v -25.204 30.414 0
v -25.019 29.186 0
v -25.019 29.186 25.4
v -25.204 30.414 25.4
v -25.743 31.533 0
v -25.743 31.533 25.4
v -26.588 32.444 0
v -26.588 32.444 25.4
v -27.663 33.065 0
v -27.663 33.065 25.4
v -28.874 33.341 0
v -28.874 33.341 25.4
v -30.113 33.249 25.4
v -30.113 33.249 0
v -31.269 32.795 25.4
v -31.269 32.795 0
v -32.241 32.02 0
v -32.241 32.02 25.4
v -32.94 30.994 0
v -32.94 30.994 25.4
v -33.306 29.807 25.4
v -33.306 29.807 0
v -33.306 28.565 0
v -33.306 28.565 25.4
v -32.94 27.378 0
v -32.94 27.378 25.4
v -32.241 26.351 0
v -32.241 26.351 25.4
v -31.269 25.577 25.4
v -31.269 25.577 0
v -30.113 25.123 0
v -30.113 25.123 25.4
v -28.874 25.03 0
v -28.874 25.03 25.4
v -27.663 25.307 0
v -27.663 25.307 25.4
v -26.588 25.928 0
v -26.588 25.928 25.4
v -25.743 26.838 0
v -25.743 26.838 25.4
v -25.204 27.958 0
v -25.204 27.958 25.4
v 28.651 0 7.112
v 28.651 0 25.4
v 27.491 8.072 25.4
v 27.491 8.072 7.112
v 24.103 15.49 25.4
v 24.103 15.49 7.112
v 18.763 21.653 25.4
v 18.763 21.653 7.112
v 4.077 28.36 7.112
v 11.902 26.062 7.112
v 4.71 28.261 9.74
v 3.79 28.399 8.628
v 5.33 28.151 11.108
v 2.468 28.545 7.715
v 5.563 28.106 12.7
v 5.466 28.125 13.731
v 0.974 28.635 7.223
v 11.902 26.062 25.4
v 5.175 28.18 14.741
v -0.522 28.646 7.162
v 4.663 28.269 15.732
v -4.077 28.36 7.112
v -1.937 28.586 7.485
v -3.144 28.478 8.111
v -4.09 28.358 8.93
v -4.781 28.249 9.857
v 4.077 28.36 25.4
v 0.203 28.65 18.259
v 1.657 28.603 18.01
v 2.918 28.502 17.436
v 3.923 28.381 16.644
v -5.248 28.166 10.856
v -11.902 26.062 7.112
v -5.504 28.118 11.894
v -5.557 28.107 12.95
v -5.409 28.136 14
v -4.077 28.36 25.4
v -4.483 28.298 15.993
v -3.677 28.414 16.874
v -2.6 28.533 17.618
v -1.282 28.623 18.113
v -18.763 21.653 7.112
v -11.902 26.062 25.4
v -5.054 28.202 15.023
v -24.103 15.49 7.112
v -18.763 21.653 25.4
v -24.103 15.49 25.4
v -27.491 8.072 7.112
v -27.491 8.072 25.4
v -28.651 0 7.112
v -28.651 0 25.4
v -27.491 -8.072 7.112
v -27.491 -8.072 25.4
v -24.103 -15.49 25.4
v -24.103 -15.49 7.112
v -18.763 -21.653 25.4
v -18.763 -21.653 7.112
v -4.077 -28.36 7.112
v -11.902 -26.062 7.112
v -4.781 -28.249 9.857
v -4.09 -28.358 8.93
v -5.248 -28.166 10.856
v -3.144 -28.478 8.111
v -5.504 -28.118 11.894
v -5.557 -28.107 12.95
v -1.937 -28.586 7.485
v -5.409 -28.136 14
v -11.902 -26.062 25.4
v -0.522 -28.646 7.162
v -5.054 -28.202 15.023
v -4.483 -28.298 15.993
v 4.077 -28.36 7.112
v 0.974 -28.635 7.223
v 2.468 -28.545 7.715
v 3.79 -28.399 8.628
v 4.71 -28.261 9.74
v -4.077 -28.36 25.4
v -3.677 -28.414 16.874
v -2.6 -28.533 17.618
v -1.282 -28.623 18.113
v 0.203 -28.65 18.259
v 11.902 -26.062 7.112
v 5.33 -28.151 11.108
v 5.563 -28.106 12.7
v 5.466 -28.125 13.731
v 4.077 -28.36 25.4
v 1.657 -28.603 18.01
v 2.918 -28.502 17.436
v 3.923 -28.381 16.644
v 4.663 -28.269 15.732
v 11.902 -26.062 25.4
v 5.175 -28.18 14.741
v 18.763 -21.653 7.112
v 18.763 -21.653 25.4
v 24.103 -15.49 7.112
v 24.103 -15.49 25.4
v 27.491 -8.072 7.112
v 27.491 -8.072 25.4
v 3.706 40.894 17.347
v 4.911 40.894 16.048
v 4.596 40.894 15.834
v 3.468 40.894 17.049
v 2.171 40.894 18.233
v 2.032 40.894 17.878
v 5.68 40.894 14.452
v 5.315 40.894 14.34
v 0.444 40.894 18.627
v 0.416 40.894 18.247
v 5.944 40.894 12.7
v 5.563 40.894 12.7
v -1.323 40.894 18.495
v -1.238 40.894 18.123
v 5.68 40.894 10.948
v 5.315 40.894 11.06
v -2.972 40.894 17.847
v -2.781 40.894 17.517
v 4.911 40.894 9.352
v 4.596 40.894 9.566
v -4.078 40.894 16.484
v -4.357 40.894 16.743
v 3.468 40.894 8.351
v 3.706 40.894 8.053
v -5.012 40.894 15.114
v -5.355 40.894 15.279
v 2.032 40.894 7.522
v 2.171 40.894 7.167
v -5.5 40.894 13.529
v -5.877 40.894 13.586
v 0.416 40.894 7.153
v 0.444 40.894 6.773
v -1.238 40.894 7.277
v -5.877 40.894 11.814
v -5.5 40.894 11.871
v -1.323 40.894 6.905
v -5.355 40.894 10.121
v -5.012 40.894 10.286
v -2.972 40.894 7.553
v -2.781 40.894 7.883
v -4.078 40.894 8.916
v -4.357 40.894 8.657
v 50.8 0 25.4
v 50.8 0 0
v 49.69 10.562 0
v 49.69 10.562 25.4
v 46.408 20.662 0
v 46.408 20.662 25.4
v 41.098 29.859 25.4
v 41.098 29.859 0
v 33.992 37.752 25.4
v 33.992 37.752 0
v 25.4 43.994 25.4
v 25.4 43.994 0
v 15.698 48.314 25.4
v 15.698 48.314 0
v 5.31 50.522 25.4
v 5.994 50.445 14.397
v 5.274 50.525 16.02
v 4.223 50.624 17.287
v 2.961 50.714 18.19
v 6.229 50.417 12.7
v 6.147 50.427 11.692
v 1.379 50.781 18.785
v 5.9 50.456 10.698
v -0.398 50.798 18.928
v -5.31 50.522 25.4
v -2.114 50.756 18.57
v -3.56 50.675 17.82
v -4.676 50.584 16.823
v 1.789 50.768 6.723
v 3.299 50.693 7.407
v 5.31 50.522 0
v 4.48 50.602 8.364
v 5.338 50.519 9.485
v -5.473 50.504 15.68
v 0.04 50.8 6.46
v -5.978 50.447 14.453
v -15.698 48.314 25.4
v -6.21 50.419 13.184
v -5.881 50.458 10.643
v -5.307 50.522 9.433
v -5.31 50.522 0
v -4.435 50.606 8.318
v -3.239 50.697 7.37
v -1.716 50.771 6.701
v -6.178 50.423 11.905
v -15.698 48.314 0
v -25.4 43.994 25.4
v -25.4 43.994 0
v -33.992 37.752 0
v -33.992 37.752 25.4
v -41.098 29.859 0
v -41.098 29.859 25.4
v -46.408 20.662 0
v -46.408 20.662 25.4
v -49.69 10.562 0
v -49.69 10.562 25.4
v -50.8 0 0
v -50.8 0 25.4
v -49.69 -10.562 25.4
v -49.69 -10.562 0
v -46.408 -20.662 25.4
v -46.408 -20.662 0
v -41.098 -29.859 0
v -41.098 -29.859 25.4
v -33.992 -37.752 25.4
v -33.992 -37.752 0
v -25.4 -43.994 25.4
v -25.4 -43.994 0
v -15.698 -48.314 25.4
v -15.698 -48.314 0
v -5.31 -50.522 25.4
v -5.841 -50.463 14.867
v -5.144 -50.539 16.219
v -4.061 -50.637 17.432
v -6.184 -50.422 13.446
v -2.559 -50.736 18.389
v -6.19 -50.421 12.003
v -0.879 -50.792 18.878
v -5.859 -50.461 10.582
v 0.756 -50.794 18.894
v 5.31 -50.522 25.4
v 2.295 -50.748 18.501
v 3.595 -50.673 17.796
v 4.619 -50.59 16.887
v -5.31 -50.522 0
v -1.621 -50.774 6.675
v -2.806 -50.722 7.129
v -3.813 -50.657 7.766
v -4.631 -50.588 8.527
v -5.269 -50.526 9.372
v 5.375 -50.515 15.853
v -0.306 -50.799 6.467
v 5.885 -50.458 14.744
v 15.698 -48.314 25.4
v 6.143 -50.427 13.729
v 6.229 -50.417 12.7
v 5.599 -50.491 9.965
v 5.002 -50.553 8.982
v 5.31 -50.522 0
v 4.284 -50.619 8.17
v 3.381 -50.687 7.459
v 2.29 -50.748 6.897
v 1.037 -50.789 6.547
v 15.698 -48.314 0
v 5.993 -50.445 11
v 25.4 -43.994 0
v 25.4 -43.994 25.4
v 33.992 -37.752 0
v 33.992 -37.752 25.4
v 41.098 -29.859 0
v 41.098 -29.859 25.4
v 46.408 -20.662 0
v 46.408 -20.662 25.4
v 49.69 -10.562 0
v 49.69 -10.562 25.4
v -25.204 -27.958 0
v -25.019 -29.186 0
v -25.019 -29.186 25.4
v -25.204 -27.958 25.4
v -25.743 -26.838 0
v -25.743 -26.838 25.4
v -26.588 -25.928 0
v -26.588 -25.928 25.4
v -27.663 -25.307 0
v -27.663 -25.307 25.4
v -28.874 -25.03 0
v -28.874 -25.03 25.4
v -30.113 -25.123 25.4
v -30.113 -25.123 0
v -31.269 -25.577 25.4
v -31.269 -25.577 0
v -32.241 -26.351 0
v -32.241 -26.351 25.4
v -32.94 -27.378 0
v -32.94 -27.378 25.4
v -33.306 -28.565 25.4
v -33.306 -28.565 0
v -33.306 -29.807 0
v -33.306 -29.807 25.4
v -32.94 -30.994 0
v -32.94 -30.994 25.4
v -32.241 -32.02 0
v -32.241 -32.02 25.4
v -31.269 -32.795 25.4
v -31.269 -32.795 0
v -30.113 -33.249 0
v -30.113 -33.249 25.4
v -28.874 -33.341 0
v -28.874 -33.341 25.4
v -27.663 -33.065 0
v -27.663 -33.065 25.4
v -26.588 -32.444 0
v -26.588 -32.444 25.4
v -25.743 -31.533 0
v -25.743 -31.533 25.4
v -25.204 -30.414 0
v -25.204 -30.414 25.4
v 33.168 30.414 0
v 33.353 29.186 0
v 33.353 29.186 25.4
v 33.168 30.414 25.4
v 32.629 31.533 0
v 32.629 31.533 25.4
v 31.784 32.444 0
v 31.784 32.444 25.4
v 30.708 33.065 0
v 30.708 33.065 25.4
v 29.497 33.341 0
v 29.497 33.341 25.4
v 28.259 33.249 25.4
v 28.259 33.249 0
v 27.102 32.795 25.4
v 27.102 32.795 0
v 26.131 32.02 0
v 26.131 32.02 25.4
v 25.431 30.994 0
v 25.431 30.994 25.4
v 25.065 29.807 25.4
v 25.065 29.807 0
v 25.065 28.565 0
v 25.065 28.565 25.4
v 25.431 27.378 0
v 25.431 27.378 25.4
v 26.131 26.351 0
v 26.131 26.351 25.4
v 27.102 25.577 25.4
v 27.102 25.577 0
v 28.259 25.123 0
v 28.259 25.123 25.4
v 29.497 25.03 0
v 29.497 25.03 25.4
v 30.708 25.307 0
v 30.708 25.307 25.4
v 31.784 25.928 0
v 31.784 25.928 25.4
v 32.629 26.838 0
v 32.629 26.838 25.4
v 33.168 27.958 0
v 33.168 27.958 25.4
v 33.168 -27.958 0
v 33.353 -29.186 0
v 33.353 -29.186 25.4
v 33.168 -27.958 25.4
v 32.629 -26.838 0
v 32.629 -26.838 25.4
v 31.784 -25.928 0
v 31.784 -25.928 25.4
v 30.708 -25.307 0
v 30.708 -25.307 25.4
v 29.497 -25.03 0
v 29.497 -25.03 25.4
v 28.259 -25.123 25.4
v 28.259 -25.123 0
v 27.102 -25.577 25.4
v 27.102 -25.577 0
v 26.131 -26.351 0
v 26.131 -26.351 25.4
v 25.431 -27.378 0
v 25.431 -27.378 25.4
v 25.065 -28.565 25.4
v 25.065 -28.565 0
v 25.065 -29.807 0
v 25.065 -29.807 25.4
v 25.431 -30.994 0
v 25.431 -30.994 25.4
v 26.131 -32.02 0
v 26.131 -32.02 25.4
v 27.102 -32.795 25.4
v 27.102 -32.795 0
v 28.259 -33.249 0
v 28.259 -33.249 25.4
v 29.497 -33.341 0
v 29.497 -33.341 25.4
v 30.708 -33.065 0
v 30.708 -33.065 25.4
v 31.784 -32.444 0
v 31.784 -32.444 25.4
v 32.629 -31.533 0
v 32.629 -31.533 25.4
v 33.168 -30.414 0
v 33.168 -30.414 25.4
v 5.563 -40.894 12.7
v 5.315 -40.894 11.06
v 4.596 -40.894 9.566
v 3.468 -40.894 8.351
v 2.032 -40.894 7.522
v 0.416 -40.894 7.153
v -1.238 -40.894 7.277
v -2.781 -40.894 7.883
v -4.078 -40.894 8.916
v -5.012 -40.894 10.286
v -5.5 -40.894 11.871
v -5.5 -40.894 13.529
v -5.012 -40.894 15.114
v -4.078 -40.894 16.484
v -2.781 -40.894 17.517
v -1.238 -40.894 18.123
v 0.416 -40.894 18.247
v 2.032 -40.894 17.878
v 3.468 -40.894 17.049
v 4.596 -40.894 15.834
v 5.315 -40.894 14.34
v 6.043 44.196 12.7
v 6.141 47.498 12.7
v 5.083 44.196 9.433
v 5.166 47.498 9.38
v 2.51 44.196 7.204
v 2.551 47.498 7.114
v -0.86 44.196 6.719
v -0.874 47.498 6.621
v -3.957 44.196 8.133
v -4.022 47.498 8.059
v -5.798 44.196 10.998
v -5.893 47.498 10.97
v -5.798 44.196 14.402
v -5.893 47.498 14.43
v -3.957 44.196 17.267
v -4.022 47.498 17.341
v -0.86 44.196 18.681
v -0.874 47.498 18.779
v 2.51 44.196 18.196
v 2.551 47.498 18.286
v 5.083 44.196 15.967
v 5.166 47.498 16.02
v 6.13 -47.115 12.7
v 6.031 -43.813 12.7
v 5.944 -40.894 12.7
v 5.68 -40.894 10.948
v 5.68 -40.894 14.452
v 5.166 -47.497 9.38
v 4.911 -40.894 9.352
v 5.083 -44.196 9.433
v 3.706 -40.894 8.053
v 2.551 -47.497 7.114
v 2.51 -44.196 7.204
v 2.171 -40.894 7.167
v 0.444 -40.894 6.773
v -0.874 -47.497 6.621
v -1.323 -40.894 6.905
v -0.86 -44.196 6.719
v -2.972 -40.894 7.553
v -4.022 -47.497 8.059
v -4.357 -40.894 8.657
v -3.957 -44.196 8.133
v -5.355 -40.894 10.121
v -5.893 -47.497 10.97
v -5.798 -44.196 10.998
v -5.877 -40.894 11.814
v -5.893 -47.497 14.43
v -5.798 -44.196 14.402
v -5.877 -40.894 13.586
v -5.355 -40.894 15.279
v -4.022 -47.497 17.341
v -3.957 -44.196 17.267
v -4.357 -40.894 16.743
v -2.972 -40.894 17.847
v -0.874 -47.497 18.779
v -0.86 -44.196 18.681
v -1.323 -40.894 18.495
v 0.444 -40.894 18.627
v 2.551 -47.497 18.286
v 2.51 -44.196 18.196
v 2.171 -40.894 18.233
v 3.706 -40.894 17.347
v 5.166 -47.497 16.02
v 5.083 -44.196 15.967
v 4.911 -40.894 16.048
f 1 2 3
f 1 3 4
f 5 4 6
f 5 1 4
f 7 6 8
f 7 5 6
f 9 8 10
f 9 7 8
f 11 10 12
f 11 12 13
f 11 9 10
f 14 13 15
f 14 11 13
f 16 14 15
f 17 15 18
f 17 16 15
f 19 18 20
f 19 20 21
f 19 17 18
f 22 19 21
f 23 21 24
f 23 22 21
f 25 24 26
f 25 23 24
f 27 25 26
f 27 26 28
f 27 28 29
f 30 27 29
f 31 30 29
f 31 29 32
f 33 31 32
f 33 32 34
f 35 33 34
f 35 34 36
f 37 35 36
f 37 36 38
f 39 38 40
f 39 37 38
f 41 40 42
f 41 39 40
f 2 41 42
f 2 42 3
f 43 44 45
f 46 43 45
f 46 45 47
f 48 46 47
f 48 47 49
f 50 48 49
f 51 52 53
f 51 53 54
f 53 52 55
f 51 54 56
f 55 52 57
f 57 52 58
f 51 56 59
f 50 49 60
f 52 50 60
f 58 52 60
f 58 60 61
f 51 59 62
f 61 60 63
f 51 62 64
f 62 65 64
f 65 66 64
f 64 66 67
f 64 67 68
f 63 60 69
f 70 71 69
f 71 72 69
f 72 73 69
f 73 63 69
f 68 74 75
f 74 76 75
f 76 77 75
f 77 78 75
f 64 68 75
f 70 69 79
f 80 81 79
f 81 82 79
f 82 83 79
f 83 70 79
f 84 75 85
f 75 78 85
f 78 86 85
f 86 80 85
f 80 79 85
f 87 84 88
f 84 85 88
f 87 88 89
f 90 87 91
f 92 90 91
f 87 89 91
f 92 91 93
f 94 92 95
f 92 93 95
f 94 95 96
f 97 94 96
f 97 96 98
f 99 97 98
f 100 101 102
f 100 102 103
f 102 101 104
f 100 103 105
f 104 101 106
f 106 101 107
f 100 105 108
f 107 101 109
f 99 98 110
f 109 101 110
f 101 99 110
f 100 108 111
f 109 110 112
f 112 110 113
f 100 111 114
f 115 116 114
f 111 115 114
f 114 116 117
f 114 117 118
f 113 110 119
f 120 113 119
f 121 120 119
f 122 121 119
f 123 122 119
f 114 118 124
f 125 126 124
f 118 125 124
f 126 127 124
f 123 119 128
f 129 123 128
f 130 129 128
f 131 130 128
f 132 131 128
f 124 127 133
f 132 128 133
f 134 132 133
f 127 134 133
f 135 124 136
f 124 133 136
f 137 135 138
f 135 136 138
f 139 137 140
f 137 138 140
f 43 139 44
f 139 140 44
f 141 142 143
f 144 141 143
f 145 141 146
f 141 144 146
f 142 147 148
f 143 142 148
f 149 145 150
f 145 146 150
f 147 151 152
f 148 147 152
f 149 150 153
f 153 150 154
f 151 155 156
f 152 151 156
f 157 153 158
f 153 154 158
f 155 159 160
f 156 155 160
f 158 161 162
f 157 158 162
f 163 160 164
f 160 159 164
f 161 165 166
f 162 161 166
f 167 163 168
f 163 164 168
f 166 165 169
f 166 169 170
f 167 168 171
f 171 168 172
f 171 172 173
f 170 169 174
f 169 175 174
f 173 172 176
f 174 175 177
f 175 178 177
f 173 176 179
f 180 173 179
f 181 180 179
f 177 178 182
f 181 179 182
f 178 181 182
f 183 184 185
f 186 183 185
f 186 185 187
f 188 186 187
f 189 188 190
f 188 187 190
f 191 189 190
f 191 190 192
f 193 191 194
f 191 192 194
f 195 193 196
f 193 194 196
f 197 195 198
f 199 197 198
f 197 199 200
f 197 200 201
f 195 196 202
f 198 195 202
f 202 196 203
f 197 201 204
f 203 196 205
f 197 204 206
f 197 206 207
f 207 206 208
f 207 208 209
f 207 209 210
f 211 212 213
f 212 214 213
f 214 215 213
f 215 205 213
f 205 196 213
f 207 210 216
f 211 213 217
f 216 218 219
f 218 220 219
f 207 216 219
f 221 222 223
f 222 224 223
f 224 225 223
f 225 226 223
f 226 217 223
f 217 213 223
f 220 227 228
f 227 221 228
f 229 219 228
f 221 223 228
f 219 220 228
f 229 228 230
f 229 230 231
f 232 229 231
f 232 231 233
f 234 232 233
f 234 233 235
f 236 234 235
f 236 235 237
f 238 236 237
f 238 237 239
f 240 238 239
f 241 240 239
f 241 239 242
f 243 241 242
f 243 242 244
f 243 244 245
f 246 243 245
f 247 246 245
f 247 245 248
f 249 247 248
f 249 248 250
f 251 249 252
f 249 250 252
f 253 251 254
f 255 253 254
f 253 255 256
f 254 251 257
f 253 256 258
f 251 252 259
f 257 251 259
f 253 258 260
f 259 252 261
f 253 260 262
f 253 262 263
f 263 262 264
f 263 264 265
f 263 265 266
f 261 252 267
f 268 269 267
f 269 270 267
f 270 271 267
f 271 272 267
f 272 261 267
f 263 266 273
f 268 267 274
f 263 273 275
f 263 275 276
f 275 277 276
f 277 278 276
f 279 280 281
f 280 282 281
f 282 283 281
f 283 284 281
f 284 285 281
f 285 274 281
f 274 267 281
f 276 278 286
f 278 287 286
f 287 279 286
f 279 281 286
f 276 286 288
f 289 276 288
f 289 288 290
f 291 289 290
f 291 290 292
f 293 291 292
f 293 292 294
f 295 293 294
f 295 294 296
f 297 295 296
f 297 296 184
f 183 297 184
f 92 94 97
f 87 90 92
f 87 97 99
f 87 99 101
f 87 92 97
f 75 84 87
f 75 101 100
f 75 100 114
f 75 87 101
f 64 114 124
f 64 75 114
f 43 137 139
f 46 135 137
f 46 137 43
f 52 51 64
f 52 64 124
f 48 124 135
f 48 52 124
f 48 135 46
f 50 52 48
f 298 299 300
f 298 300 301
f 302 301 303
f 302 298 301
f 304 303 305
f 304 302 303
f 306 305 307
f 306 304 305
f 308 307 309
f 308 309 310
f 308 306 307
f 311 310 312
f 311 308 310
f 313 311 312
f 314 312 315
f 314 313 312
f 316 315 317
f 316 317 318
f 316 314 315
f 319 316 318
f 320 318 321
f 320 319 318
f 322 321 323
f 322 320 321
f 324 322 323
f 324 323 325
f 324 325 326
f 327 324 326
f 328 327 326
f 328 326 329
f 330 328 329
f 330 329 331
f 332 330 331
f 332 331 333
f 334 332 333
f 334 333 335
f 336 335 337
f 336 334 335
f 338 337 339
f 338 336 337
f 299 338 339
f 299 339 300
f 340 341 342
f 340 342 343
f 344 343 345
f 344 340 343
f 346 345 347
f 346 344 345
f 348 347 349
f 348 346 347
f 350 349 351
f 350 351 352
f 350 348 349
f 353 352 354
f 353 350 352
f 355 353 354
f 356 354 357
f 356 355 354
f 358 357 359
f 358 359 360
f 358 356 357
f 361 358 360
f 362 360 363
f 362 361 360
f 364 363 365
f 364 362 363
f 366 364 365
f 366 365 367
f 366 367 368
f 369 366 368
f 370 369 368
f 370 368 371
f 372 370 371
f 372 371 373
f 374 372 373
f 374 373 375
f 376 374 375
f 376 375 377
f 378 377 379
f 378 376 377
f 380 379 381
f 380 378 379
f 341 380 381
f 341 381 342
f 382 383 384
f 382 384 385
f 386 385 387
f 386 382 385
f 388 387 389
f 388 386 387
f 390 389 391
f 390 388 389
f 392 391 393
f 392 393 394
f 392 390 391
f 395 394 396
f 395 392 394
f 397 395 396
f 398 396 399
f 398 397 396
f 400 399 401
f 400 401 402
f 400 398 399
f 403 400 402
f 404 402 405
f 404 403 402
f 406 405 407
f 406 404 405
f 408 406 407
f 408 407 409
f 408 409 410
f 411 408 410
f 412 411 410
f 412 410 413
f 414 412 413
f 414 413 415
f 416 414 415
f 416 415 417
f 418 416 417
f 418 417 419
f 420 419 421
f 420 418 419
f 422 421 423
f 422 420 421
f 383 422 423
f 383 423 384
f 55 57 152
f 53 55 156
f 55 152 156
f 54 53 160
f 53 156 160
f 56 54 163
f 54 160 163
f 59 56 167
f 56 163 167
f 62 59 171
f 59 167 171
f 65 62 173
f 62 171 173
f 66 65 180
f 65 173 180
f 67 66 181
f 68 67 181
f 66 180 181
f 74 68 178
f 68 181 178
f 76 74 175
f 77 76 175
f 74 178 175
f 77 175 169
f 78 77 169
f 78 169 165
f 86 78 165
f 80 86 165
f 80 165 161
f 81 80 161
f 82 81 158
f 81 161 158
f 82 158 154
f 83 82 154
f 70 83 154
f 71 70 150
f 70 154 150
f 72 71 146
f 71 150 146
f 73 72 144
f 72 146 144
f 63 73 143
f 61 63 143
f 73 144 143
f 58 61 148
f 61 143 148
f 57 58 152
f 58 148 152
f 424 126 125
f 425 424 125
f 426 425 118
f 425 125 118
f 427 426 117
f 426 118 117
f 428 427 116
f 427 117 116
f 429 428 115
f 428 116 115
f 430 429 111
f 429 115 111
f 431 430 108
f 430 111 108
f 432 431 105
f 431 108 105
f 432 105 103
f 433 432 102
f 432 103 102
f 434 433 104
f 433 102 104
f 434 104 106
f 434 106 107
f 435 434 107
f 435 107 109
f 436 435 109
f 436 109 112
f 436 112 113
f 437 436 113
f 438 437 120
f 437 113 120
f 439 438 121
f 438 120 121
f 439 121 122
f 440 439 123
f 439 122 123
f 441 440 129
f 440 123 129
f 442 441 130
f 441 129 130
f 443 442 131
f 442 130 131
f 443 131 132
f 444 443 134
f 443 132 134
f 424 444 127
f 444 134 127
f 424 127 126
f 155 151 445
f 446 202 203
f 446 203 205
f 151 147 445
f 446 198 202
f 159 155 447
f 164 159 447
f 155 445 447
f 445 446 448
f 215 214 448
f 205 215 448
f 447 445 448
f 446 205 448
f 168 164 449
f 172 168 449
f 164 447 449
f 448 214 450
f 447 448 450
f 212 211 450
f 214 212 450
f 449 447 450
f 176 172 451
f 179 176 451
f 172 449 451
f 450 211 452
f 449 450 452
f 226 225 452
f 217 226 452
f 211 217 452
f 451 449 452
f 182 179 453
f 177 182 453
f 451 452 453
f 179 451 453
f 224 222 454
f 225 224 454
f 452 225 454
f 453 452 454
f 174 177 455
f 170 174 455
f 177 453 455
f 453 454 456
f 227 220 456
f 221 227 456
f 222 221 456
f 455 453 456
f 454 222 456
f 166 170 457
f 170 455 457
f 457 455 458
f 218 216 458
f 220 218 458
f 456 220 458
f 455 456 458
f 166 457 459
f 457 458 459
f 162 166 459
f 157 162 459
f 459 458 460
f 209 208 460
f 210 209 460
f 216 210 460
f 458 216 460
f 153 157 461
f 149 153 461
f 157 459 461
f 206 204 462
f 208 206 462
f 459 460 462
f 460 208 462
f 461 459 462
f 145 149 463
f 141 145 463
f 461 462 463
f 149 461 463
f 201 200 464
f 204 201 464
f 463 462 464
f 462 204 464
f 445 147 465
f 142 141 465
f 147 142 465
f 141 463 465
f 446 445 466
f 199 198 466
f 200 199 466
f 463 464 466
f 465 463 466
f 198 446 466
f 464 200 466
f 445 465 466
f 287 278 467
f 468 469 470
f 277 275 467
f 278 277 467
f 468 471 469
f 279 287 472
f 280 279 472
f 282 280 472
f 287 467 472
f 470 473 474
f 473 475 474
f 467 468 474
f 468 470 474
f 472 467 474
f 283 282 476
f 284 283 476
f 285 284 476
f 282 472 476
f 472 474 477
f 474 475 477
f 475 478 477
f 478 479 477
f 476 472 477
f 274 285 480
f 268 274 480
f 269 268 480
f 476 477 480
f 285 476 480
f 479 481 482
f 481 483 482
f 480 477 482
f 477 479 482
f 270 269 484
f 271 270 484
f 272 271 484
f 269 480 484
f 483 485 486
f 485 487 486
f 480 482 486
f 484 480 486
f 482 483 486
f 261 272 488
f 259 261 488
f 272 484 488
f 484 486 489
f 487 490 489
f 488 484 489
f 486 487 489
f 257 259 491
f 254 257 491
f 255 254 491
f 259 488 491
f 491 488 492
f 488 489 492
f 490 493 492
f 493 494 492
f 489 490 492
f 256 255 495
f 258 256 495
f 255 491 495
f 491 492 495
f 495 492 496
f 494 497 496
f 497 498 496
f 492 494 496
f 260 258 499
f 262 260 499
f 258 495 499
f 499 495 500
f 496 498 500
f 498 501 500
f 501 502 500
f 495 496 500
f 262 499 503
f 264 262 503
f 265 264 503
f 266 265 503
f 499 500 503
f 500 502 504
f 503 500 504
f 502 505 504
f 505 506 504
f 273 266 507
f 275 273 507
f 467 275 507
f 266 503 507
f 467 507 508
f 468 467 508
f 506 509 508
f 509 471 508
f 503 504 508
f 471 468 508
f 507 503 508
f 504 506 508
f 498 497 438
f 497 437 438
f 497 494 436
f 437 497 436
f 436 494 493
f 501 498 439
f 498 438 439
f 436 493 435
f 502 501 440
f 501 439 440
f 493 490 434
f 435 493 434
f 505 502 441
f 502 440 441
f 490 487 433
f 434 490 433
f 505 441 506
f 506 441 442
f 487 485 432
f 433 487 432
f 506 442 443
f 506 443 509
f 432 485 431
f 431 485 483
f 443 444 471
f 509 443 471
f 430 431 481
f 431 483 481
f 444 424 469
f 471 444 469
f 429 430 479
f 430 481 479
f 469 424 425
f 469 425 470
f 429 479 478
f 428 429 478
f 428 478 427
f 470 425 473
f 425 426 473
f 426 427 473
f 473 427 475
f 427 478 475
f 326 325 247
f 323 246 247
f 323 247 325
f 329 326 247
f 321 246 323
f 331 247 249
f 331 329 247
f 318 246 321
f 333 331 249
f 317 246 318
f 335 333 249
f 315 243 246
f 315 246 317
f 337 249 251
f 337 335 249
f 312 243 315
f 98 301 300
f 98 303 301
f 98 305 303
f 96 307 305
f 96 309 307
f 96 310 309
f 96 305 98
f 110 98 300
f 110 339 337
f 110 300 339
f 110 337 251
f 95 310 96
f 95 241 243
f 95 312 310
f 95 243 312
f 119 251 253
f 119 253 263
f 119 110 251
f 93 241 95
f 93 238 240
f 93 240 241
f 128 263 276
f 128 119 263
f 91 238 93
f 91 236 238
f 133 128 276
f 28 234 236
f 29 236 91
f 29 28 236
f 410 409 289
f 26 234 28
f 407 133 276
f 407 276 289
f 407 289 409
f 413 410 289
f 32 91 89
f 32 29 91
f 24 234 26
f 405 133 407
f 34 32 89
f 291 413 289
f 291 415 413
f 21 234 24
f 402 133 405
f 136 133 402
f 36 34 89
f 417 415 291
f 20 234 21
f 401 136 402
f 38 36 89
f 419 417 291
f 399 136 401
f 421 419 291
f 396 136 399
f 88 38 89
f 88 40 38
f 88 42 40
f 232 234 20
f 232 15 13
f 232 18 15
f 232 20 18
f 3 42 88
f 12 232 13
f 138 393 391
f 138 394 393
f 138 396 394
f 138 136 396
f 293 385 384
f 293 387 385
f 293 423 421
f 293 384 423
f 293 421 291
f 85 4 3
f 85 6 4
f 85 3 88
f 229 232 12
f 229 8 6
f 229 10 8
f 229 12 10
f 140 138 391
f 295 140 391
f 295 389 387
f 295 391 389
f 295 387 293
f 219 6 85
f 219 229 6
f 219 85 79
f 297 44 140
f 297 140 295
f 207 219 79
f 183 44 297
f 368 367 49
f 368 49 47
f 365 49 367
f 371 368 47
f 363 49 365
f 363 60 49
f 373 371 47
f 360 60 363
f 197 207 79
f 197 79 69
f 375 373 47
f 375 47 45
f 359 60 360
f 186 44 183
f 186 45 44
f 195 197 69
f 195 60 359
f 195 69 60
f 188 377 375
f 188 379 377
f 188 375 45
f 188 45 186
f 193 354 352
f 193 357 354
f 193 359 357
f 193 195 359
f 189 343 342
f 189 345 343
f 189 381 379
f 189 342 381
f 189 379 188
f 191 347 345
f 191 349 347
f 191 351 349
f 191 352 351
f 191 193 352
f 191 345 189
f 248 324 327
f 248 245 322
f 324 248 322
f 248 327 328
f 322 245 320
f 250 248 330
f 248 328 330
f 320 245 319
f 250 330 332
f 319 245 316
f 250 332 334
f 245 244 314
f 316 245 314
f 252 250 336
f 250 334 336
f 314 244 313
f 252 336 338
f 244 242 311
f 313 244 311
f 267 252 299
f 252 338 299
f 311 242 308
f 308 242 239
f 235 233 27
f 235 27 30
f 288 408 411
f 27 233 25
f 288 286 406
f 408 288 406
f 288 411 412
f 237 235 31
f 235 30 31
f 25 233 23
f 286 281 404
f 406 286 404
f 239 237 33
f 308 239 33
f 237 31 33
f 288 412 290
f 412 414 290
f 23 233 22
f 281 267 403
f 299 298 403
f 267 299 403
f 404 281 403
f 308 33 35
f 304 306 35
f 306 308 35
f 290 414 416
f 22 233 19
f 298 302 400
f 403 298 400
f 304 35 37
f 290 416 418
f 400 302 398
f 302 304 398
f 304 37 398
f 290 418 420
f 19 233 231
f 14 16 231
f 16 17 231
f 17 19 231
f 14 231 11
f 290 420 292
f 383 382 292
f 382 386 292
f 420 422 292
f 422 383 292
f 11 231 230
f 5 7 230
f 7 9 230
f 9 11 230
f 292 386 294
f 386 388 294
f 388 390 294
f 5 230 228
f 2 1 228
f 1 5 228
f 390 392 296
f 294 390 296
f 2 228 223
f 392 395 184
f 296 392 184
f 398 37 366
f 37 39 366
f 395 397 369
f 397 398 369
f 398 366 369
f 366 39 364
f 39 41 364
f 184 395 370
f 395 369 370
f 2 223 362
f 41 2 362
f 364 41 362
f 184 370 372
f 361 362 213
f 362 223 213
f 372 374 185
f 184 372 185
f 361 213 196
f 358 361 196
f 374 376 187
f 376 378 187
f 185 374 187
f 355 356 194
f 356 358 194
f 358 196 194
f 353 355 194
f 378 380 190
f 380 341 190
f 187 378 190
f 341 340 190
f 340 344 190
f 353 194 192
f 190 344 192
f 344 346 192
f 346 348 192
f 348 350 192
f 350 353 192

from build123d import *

# Parameters (mm, degrees)
SKETCH1_R           = 50.8
SKETCH1_R_2         = 4.1671875
BOSS_EXTRUDE1_DEPTH = 25.4
SKETCH2_R           = 28.6512
CUT_EXTRUDE1_DEPTH  = 18.288


# Read off the part's stored shape, not the designer's step: 1/4 NPT Tapped Hole1
with BuildPart() as part:
    # Sketch1 → Boss-Extrude1 (new body)
    with BuildSketch(Plane.XY):
        Circle(SKETCH1_R)
        with Locations((-29.185832393, 29.185832393)):
            Circle(SKETCH1_R_2, mode=Mode.SUBTRACT)
        with Locations((-29.185832393, -29.185832393)):
            Circle(SKETCH1_R_2, mode=Mode.SUBTRACT)
        with Locations((29.185832393, -29.185832393)):
            Circle(SKETCH1_R_2, mode=Mode.SUBTRACT)
        with Locations((29.185832393, 29.185832393)):
            Circle(SKETCH1_R_2, mode=Mode.SUBTRACT)
    extrude(amount=BOSS_EXTRUDE1_DEPTH)

    # Sketch2 → Cut-Extrude1 (cut)
    with BuildSketch(Plane.XY.offset(25.4)):
        Circle(SKETCH2_R)
    extrude(amount=-CUT_EXTRUDE1_DEPTH, mode=Mode.SUBTRACT)

    # 1/4 NPT Tapped Hole1 outline → 1/4 NPT Tapped Hole1 (revolve, cut)
    with BuildSketch(Plane.XY.offset(12.7)):
        Polygon((6.24028647, -50.800059108), (5.943685794, -40.894), (5.5626, -40.894), (5.5626, -28.105874104), (0, -28.105874104), (0, -50.800059108), align=None)
        Polygon((0, 28.105874104), (5.5626, 28.105874104), (5.5626, 40.894), (5.943685794, 40.894), (6.2402863, 50.800053431), (0, 50.800053431), align=None)
    revolve(axis=Axis((0, 0, 12.7), (0, 1, 0)), mode=Mode.SUBTRACT)


solid = part.part
